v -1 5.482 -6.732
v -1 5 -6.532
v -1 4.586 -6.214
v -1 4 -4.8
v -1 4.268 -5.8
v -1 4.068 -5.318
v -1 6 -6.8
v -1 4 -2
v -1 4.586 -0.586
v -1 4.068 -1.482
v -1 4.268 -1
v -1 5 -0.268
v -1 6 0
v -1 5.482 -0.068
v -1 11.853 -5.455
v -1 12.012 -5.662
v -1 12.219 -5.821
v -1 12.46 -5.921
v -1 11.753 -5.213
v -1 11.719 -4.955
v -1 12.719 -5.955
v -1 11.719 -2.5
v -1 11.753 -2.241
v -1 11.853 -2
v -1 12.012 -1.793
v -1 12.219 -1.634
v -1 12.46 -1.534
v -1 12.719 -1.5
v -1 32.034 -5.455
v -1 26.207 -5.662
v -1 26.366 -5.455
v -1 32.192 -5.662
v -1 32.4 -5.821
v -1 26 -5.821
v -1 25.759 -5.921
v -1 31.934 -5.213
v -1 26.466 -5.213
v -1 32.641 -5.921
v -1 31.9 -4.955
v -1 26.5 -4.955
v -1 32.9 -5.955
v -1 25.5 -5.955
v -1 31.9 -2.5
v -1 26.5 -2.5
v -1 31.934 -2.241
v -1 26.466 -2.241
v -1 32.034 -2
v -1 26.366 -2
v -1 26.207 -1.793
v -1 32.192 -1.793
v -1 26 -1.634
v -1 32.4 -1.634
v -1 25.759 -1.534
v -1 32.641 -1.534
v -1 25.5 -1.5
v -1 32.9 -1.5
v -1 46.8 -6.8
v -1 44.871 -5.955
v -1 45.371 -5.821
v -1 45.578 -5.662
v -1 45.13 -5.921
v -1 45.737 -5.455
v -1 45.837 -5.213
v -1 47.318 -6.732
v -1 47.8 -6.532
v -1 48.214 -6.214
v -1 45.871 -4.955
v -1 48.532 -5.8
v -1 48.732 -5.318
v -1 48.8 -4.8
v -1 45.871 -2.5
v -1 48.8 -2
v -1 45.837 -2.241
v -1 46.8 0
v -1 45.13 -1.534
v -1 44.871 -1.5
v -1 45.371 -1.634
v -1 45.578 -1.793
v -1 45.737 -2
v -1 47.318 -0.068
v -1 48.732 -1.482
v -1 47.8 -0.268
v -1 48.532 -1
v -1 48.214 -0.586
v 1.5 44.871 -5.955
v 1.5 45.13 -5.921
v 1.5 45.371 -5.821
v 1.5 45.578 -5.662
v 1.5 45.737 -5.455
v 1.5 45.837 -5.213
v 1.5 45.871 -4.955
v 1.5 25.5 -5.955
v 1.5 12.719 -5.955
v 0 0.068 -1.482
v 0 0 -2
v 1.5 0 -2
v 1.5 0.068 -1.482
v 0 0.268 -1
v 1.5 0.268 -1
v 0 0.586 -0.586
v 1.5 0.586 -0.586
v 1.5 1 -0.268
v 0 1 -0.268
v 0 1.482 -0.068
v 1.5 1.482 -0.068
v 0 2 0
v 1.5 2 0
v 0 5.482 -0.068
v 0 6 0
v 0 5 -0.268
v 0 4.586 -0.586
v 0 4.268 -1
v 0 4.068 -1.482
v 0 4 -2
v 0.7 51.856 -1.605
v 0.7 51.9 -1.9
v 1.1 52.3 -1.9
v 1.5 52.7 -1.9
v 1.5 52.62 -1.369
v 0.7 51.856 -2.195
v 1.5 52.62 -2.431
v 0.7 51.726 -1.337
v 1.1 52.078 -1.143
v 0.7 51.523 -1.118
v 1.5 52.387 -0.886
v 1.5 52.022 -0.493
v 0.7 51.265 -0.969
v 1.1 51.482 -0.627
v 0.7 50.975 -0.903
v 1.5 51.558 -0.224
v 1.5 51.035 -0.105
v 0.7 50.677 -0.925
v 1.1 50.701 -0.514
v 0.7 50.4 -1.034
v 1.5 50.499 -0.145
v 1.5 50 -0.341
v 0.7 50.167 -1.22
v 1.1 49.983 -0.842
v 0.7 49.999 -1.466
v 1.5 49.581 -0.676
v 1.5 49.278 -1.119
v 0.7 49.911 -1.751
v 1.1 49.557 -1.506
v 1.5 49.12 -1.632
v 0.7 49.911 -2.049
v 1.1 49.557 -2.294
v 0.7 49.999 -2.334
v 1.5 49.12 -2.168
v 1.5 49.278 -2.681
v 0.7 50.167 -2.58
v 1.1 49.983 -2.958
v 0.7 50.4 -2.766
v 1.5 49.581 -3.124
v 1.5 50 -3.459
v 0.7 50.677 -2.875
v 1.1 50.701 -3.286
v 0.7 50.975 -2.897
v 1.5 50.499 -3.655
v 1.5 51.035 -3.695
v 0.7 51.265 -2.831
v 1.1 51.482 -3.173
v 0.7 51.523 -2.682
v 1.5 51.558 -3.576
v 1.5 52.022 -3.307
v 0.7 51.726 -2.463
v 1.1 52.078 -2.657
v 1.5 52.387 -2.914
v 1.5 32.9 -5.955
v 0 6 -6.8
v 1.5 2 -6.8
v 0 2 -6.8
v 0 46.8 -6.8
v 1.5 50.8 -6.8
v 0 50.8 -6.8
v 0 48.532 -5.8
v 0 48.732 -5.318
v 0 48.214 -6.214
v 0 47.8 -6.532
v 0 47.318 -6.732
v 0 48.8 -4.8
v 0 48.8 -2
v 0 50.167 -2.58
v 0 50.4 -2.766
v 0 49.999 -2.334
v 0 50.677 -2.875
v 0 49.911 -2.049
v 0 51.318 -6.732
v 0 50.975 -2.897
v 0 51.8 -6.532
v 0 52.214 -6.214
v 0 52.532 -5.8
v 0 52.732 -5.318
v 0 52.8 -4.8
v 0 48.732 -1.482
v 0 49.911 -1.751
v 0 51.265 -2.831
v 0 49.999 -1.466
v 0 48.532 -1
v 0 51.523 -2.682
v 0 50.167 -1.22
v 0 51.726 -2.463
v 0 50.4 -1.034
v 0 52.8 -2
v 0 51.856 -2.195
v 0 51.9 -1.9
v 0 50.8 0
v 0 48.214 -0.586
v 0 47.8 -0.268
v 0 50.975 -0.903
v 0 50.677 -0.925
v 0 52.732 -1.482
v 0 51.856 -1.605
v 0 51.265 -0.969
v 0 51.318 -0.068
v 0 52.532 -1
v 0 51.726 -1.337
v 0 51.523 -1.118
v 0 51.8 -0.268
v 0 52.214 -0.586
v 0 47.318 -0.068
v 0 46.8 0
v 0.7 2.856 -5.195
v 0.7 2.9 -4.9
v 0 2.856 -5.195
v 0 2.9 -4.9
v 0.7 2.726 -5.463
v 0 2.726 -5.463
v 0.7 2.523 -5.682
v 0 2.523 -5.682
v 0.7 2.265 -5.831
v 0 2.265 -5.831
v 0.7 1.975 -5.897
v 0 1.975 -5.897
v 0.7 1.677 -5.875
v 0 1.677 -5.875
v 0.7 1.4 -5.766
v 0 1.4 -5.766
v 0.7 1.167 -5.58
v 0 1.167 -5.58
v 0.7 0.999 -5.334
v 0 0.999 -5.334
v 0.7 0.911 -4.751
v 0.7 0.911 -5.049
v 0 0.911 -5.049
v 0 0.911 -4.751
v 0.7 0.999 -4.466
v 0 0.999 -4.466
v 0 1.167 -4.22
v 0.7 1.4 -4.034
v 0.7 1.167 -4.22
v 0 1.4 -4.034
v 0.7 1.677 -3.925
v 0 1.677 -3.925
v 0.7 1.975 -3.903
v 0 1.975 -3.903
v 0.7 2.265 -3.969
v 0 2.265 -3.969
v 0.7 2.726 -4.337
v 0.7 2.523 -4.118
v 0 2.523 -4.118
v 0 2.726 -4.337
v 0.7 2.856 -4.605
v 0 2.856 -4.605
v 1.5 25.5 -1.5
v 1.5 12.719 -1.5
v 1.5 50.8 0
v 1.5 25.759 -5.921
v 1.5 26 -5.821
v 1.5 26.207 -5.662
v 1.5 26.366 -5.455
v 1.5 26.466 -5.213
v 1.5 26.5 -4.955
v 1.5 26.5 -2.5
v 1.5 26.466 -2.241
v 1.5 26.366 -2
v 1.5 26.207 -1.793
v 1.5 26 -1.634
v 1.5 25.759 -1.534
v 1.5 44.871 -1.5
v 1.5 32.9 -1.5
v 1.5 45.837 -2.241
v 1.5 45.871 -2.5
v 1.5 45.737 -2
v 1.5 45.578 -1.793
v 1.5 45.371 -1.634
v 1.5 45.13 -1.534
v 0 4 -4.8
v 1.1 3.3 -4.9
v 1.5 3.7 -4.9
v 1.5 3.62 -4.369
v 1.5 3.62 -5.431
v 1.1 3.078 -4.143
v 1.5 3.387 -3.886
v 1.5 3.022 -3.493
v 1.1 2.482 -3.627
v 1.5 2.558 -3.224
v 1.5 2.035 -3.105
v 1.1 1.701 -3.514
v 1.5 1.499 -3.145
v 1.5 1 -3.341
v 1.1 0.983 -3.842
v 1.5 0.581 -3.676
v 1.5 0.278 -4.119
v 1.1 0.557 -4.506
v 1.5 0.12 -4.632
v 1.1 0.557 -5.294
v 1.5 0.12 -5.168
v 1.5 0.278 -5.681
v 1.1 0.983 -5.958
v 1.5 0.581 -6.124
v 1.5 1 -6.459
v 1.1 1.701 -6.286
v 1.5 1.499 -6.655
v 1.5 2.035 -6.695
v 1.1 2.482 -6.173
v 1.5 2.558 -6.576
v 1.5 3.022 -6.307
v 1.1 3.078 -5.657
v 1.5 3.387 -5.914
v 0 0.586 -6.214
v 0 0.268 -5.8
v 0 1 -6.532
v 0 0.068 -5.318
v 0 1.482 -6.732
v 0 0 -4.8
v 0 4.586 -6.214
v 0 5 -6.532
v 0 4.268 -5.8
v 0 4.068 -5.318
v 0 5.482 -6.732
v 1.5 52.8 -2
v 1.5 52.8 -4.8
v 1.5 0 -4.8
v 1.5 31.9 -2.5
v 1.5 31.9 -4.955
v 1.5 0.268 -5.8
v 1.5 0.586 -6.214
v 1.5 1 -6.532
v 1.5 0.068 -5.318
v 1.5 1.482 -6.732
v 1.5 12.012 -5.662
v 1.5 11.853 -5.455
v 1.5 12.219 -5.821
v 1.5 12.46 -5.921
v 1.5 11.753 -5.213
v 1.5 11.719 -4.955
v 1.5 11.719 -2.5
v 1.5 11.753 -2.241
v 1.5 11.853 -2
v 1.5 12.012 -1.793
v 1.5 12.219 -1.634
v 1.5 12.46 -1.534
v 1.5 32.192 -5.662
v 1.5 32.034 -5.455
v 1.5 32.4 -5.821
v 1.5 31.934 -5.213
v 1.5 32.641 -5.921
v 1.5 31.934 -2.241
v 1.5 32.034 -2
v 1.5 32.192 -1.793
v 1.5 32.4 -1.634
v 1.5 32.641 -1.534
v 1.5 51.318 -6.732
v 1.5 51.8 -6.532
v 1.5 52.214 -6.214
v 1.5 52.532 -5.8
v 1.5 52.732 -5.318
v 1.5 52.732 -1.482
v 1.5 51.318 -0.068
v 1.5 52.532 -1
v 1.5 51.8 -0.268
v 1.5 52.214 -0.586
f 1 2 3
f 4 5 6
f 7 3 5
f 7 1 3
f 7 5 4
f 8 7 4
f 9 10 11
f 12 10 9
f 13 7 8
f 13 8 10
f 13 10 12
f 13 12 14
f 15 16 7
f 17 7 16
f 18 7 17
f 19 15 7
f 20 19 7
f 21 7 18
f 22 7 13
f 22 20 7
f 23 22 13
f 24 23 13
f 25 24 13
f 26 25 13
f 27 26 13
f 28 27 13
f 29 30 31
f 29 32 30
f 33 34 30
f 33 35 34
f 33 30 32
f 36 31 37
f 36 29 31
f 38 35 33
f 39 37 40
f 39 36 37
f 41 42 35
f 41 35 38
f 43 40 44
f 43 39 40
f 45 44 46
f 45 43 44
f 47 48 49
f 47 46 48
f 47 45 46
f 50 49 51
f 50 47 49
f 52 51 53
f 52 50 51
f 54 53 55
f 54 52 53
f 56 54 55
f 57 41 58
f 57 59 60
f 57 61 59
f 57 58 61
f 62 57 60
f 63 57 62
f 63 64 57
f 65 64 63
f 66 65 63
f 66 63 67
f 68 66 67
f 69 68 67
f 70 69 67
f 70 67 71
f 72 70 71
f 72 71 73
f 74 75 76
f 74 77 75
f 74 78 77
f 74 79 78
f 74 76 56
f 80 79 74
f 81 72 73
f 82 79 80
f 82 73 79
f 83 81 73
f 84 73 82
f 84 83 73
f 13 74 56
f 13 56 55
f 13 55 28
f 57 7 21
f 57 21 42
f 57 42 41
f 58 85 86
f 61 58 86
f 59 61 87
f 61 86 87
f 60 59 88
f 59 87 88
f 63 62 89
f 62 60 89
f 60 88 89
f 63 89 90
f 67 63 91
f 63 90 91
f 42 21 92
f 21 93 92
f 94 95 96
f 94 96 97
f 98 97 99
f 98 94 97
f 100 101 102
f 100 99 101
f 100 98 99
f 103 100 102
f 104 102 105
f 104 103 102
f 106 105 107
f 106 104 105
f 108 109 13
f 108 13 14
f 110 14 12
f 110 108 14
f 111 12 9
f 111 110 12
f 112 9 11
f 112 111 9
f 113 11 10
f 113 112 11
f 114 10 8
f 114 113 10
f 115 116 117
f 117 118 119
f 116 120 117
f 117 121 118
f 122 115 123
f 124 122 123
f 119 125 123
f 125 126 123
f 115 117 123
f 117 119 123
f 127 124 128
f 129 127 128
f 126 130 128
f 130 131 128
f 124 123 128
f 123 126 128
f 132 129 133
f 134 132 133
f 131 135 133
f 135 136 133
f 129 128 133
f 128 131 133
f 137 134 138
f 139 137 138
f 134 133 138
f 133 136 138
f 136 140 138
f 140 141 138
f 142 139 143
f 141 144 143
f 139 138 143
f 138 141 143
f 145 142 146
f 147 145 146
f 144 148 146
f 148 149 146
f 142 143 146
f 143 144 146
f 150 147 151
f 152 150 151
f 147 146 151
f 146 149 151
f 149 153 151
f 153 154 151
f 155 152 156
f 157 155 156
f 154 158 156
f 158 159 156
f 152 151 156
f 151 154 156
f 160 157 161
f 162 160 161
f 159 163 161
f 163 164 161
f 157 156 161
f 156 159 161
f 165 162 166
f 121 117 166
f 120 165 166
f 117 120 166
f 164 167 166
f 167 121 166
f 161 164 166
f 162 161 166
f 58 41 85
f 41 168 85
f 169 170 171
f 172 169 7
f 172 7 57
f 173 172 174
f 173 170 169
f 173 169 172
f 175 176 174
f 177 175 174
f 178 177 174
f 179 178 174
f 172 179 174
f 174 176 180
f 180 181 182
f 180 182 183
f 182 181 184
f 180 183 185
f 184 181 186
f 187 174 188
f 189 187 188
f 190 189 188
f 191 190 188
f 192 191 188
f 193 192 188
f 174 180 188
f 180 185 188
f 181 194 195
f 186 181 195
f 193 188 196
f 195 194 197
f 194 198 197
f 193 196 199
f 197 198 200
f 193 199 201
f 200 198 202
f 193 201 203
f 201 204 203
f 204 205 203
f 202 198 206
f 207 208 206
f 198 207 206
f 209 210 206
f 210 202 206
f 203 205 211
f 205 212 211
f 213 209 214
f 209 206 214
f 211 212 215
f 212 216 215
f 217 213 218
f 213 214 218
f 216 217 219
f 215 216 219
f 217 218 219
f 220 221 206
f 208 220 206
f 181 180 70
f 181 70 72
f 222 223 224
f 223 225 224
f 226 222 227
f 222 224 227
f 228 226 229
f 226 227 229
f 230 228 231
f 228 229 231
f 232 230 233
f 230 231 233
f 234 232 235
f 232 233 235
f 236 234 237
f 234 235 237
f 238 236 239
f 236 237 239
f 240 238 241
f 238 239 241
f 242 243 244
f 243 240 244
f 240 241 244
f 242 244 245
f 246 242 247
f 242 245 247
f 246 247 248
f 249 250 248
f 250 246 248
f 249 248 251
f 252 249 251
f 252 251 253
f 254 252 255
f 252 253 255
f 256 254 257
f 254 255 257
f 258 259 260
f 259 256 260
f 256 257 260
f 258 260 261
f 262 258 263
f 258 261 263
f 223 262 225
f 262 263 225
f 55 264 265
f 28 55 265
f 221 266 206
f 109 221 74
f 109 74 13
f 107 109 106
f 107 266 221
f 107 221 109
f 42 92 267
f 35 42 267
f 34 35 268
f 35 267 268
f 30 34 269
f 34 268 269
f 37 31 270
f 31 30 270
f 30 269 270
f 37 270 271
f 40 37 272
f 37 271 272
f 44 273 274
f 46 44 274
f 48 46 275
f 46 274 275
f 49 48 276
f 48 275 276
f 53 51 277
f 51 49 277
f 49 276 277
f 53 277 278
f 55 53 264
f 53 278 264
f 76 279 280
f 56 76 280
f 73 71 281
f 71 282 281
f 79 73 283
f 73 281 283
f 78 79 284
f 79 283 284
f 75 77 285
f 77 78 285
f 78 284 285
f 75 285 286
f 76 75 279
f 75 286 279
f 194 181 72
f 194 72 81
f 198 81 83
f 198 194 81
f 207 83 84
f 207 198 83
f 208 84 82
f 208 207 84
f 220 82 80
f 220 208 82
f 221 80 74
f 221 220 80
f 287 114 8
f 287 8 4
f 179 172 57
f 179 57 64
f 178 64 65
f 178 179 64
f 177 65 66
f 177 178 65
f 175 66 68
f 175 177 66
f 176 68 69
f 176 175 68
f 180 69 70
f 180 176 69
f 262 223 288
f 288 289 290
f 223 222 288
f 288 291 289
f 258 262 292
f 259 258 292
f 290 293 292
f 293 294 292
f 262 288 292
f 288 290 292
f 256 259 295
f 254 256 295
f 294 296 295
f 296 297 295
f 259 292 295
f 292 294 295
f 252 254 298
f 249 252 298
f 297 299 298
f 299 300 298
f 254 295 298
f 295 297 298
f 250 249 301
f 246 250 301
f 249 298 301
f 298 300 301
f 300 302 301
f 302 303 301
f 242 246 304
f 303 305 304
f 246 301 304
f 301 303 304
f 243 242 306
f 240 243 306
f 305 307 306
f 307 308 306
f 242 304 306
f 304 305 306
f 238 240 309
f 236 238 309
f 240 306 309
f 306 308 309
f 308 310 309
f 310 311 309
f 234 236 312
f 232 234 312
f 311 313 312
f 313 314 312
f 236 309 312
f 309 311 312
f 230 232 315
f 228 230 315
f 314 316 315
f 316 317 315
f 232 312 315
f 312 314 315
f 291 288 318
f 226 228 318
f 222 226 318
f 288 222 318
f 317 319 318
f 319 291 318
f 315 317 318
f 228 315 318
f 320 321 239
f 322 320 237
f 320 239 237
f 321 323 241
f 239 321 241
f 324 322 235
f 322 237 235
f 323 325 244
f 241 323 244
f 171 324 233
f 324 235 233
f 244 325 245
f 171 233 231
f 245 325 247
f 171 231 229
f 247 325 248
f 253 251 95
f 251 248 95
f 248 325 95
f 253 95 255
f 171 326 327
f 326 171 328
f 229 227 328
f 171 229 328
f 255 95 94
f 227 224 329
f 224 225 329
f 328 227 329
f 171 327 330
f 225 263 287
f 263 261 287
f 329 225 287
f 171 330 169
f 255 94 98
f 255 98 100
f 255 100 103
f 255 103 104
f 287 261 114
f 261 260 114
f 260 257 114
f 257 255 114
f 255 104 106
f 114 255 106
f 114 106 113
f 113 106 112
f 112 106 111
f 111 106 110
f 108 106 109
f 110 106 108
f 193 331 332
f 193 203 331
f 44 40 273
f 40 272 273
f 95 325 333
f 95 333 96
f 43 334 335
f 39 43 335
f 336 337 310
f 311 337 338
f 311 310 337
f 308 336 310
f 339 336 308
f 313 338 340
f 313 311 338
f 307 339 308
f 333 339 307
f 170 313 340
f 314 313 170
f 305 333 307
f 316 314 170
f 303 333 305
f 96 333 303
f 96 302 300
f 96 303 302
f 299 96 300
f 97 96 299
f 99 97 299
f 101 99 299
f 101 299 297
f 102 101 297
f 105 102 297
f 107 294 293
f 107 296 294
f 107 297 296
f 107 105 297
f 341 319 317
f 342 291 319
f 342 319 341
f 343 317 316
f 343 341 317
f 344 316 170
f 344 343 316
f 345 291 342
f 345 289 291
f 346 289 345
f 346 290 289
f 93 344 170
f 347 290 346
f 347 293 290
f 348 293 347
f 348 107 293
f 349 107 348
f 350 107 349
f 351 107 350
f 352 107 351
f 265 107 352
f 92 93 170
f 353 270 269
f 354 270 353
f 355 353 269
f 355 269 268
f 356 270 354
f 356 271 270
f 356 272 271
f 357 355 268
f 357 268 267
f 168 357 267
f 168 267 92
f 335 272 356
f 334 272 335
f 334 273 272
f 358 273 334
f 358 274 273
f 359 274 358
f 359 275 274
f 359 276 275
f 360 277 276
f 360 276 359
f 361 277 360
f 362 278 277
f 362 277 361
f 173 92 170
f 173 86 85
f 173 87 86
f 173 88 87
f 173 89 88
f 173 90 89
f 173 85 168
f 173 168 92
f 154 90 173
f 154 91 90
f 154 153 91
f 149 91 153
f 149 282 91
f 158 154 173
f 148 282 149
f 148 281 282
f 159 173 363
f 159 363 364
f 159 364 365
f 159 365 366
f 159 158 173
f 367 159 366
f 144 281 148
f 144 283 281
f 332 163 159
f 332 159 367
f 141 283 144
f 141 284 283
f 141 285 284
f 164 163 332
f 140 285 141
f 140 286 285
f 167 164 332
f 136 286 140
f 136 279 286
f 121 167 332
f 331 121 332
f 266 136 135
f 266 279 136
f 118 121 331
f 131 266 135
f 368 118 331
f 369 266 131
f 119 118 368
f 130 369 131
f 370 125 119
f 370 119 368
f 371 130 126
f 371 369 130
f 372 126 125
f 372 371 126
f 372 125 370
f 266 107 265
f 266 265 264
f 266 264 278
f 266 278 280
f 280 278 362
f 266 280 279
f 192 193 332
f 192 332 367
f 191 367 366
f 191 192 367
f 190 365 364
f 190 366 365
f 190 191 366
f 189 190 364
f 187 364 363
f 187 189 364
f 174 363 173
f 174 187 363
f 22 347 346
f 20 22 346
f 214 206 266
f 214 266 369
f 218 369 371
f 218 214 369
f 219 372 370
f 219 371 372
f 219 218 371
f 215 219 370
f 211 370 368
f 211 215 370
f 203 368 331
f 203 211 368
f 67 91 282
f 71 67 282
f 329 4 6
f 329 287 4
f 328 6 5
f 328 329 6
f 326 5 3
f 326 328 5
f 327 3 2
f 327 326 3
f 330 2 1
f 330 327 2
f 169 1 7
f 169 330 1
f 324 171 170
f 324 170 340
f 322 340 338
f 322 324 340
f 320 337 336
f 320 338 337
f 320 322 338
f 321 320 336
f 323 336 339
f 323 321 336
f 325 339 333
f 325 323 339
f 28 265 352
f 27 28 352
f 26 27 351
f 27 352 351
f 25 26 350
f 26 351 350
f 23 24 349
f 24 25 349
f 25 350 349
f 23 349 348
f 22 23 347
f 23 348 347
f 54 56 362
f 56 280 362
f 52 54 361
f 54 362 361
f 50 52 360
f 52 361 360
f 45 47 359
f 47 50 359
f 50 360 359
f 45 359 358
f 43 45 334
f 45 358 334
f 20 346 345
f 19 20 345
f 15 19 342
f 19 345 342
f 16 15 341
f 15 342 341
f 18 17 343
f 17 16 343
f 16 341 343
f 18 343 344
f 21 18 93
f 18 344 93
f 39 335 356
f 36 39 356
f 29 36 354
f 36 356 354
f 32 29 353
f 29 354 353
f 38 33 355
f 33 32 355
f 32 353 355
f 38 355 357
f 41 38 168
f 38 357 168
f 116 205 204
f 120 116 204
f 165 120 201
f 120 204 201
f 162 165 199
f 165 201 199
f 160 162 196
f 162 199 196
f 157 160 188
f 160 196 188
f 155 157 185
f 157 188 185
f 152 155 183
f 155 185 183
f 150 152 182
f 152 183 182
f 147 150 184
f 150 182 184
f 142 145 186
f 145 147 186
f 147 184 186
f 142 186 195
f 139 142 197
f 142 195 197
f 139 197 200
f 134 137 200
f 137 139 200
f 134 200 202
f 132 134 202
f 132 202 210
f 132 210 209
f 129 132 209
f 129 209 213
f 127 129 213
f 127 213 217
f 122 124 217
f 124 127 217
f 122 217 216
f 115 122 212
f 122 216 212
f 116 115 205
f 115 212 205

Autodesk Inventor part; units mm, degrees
ref_plane "YZ Plane" through (0, 0, 0) normal (1, 0, 0) x (0, 1, 0)
ref_plane "XZ Plane" through (0, 0, 0) normal (0, 1, 0) x (-1, 0, 0)
ref_plane "XY Plane" through (0, 0, 0) normal (0, 0, 1) x (1, 0, 0)
sketch "Sketch1" plane through (0, 0, 0) normal (1, 0, 0) x (0, 1, 0)
  line L0 (2, 0) -> (50.8, 0)
  line L1 (52.8, -2) -> (52.8, -4.8)
  line L2 (50.8, -6.8) -> (2, -6.8)
  line L3 (0, -4.8) -> (0, -2)
  arc A0 (2, 0) -> (0, -2) centre (2, -2) ccw
  arc A1 (0, -4.8) -> (2, -6.8) centre (2, -4.8) ccw
  arc A2 (50.8, -6.8) -> (52.8, -4.8) centre (50.8, -4.8) ccw
  arc A3 (52.8, -2) -> (50.8, 0) centre (50.8, -2) ccw
  line L4 (26.4, 0) -> (26.4, -6.5481) construction
  line L5 (52.8, -3.4) -> (39.7965, -3.4) construction
  circle A4 centre (1.9, -4.9) radius 1
  circle A5 centre (50.9, -4.9) radius 1 construction
  circle A6 centre (50.9, -1.9) radius 1
  point P0 (0, 0)
  point P1 (52.8, 0)
  point P2 (0, -6.8)
  dimension "d0" = 52.8
  dimension "d1" = 6.8
  dimension "d2" = 2
  dimension "d19" = 2
  dimension "d20" = 0.1
  dimension "d21" = 0.1
extrude "Extrusion1" add sketch "Sketch1" along normal blind 1.5
chamfer "Chamfer1" distance 0.8 angle 45 2 edges at (1.5, 49.9, -1.9) (1.5, 0.9, -4.9)
sketch "Sketch2" plane through (1.5, 0, 0) normal (1, 0, 0) x (0, 0, -1)
  line L0 (0, 50.8) -> (0, 2) projected
  line L1 (2.5, 45.871) -> (4.9546, 45.871)
  line L2 (5.9546, 44.871) -> (5.9546, 32.8996)
  line L3 (4.9546, 31.8996) -> (2.5, 31.8996)
  line L4 (1.5, 32.8996) -> (1.5, 44.871)
  line L5 (2.5, 26.5) -> (4.9546, 26.5)
  line L6 (5.9546, 25.5) -> (5.9546, 12.7187)
  line L7 (4.9546, 11.7187) -> (2.5, 11.7187)
  line L8 (1.5, 12.7187) -> (1.5, 25.5)
  arc A0 (5.9546, 44.871) -> (4.9546, 45.871) centre (4.9546, 44.871) ccw
  arc A1 (2.5, 45.871) -> (1.5, 44.871) centre (2.5, 44.871) ccw
  arc A2 (1.5, 32.8996) -> (2.5, 31.8996) centre (2.5, 32.8996) ccw
  arc A3 (4.9546, 31.8996) -> (5.9546, 32.8996) centre (4.9546, 32.8996) ccw
  arc A4 (5.9546, 25.5) -> (4.9546, 26.5) centre (4.9546, 25.5) ccw
  arc A5 (4.9546, 11.7187) -> (5.9546, 12.7187) centre (4.9546, 12.7187) ccw
  arc A6 (1.5, 12.7187) -> (2.5, 11.7187) centre (2.5, 12.7187) ccw
  arc A7 (2.5, 26.5) -> (1.5, 25.5) centre (2.5, 25.5) ccw
  point P0 (0, 0)
  dimension "d9" = 1
  dimension "d10" = 1.5
  dimension "d11" = 1.5
extrude "Extrusion2" cut sketch "Sketch2" against normal blind 1.5
sketch "Sketch3" plane through (0, 0, 0) normal (-1, 0, 0) x (0, 0, 1)
  arc A0 (-1.5, 44.871) -> (-2.5, 45.871) centre (-2.5, 44.871) ccw projected
  line L0 (-1.5, 44.871) -> (-1.5, 32.8996) projected
  arc A1 (-2.5, 31.8996) -> (-1.5, 32.8996) centre (-2.5, 32.8996) ccw projected
  line L1 (-2.5, 31.8996) -> (-4.9546, 31.8996) projected
  arc A2 (-5.9546, 32.8996) -> (-4.9546, 31.8996) centre (-4.9546, 32.8996) ccw projected
  line L2 (-5.9546, 32.8996) -> (-5.9546, 44.871) projected
  arc A3 (-4.9546, 45.871) -> (-5.9546, 44.871) centre (-4.9546, 44.871) ccw projected
  line L3 (-4.9546, 45.871) -> (-2.5, 45.871) projected
  arc A4 (-4.9546, 26.5) -> (-5.9546, 25.5) centre (-4.9546, 25.5) ccw projected
  line L4 (-4.9546, 26.5) -> (-2.5, 26.5) projected
  arc A5 (-1.5, 25.5) -> (-2.5, 26.5) centre (-2.5, 25.5) ccw projected
  line L5 (-1.5, 25.5) -> (-1.5, 12.7187) projected
  arc A6 (-2.5, 11.7187) -> (-1.5, 12.7187) centre (-2.5, 12.7187) ccw projected
  line L6 (-2.5, 11.7187) -> (-4.9546, 11.7187) projected
  arc A7 (-5.9546, 12.7187) -> (-4.9546, 11.7187) centre (-4.9546, 12.7187) ccw projected
  line L7 (-5.9546, 12.7187) -> (-5.9546, 25.5) projected
  line L8 (0, 50.8) -> (0, 2) projected
  line L9 (-4.8, 52.8) -> (-2, 52.8) projected
  line L10 (-4.8, 48.8) -> (-2, 48.8)
  line L11 (0, 46.8) -> (0, 6)
  line L12 (-2, 4) -> (-4.8, 4)
  line L13 (-6.8, 6) -> (-6.8, 46.8)
  arc A8 (-4.8, 48.8) -> (-6.8, 46.8) centre (-4.8, 46.8) ccw
  arc A9 (0, 46.8) -> (-2, 48.8) centre (-2, 46.8) ccw
  arc A10 (-2, 4) -> (0, 6) centre (-2, 6) ccw
  arc A11 (-6.8, 6) -> (-4.8, 4) centre (-4.8, 6) ccw
  line L14 (-3.4, 52.8) -> (-3.4, 49.069) construction
  line L15 (-3.4, 48.8) -> (-3.4, 44.871) construction
  line L16 (0, 26.4) -> (-3, 26.4) construction
  line L17 (-6.8, 26.4) -> (-12.1303, 26.4) construction
  point P0 (0, 0)
  point P1 (0, 4)
  point P2 (0, 48.8)
  point P3 (-6.8, 4)
  point P4 (-6.8, 45.8508)
  point P5 (-6.8, 31.9198)
  point P6 (-6.8, 26.4798)
  point P7 (-6.8, 11.7389)
  dimension "d14" = 6.8
  dimension "d15" = 44.8
  dimension "d16" = 2
extrude "Extrusion3" add sketch "Sketch3" along normal blind 1
properties part number "IOModulePlate01"
